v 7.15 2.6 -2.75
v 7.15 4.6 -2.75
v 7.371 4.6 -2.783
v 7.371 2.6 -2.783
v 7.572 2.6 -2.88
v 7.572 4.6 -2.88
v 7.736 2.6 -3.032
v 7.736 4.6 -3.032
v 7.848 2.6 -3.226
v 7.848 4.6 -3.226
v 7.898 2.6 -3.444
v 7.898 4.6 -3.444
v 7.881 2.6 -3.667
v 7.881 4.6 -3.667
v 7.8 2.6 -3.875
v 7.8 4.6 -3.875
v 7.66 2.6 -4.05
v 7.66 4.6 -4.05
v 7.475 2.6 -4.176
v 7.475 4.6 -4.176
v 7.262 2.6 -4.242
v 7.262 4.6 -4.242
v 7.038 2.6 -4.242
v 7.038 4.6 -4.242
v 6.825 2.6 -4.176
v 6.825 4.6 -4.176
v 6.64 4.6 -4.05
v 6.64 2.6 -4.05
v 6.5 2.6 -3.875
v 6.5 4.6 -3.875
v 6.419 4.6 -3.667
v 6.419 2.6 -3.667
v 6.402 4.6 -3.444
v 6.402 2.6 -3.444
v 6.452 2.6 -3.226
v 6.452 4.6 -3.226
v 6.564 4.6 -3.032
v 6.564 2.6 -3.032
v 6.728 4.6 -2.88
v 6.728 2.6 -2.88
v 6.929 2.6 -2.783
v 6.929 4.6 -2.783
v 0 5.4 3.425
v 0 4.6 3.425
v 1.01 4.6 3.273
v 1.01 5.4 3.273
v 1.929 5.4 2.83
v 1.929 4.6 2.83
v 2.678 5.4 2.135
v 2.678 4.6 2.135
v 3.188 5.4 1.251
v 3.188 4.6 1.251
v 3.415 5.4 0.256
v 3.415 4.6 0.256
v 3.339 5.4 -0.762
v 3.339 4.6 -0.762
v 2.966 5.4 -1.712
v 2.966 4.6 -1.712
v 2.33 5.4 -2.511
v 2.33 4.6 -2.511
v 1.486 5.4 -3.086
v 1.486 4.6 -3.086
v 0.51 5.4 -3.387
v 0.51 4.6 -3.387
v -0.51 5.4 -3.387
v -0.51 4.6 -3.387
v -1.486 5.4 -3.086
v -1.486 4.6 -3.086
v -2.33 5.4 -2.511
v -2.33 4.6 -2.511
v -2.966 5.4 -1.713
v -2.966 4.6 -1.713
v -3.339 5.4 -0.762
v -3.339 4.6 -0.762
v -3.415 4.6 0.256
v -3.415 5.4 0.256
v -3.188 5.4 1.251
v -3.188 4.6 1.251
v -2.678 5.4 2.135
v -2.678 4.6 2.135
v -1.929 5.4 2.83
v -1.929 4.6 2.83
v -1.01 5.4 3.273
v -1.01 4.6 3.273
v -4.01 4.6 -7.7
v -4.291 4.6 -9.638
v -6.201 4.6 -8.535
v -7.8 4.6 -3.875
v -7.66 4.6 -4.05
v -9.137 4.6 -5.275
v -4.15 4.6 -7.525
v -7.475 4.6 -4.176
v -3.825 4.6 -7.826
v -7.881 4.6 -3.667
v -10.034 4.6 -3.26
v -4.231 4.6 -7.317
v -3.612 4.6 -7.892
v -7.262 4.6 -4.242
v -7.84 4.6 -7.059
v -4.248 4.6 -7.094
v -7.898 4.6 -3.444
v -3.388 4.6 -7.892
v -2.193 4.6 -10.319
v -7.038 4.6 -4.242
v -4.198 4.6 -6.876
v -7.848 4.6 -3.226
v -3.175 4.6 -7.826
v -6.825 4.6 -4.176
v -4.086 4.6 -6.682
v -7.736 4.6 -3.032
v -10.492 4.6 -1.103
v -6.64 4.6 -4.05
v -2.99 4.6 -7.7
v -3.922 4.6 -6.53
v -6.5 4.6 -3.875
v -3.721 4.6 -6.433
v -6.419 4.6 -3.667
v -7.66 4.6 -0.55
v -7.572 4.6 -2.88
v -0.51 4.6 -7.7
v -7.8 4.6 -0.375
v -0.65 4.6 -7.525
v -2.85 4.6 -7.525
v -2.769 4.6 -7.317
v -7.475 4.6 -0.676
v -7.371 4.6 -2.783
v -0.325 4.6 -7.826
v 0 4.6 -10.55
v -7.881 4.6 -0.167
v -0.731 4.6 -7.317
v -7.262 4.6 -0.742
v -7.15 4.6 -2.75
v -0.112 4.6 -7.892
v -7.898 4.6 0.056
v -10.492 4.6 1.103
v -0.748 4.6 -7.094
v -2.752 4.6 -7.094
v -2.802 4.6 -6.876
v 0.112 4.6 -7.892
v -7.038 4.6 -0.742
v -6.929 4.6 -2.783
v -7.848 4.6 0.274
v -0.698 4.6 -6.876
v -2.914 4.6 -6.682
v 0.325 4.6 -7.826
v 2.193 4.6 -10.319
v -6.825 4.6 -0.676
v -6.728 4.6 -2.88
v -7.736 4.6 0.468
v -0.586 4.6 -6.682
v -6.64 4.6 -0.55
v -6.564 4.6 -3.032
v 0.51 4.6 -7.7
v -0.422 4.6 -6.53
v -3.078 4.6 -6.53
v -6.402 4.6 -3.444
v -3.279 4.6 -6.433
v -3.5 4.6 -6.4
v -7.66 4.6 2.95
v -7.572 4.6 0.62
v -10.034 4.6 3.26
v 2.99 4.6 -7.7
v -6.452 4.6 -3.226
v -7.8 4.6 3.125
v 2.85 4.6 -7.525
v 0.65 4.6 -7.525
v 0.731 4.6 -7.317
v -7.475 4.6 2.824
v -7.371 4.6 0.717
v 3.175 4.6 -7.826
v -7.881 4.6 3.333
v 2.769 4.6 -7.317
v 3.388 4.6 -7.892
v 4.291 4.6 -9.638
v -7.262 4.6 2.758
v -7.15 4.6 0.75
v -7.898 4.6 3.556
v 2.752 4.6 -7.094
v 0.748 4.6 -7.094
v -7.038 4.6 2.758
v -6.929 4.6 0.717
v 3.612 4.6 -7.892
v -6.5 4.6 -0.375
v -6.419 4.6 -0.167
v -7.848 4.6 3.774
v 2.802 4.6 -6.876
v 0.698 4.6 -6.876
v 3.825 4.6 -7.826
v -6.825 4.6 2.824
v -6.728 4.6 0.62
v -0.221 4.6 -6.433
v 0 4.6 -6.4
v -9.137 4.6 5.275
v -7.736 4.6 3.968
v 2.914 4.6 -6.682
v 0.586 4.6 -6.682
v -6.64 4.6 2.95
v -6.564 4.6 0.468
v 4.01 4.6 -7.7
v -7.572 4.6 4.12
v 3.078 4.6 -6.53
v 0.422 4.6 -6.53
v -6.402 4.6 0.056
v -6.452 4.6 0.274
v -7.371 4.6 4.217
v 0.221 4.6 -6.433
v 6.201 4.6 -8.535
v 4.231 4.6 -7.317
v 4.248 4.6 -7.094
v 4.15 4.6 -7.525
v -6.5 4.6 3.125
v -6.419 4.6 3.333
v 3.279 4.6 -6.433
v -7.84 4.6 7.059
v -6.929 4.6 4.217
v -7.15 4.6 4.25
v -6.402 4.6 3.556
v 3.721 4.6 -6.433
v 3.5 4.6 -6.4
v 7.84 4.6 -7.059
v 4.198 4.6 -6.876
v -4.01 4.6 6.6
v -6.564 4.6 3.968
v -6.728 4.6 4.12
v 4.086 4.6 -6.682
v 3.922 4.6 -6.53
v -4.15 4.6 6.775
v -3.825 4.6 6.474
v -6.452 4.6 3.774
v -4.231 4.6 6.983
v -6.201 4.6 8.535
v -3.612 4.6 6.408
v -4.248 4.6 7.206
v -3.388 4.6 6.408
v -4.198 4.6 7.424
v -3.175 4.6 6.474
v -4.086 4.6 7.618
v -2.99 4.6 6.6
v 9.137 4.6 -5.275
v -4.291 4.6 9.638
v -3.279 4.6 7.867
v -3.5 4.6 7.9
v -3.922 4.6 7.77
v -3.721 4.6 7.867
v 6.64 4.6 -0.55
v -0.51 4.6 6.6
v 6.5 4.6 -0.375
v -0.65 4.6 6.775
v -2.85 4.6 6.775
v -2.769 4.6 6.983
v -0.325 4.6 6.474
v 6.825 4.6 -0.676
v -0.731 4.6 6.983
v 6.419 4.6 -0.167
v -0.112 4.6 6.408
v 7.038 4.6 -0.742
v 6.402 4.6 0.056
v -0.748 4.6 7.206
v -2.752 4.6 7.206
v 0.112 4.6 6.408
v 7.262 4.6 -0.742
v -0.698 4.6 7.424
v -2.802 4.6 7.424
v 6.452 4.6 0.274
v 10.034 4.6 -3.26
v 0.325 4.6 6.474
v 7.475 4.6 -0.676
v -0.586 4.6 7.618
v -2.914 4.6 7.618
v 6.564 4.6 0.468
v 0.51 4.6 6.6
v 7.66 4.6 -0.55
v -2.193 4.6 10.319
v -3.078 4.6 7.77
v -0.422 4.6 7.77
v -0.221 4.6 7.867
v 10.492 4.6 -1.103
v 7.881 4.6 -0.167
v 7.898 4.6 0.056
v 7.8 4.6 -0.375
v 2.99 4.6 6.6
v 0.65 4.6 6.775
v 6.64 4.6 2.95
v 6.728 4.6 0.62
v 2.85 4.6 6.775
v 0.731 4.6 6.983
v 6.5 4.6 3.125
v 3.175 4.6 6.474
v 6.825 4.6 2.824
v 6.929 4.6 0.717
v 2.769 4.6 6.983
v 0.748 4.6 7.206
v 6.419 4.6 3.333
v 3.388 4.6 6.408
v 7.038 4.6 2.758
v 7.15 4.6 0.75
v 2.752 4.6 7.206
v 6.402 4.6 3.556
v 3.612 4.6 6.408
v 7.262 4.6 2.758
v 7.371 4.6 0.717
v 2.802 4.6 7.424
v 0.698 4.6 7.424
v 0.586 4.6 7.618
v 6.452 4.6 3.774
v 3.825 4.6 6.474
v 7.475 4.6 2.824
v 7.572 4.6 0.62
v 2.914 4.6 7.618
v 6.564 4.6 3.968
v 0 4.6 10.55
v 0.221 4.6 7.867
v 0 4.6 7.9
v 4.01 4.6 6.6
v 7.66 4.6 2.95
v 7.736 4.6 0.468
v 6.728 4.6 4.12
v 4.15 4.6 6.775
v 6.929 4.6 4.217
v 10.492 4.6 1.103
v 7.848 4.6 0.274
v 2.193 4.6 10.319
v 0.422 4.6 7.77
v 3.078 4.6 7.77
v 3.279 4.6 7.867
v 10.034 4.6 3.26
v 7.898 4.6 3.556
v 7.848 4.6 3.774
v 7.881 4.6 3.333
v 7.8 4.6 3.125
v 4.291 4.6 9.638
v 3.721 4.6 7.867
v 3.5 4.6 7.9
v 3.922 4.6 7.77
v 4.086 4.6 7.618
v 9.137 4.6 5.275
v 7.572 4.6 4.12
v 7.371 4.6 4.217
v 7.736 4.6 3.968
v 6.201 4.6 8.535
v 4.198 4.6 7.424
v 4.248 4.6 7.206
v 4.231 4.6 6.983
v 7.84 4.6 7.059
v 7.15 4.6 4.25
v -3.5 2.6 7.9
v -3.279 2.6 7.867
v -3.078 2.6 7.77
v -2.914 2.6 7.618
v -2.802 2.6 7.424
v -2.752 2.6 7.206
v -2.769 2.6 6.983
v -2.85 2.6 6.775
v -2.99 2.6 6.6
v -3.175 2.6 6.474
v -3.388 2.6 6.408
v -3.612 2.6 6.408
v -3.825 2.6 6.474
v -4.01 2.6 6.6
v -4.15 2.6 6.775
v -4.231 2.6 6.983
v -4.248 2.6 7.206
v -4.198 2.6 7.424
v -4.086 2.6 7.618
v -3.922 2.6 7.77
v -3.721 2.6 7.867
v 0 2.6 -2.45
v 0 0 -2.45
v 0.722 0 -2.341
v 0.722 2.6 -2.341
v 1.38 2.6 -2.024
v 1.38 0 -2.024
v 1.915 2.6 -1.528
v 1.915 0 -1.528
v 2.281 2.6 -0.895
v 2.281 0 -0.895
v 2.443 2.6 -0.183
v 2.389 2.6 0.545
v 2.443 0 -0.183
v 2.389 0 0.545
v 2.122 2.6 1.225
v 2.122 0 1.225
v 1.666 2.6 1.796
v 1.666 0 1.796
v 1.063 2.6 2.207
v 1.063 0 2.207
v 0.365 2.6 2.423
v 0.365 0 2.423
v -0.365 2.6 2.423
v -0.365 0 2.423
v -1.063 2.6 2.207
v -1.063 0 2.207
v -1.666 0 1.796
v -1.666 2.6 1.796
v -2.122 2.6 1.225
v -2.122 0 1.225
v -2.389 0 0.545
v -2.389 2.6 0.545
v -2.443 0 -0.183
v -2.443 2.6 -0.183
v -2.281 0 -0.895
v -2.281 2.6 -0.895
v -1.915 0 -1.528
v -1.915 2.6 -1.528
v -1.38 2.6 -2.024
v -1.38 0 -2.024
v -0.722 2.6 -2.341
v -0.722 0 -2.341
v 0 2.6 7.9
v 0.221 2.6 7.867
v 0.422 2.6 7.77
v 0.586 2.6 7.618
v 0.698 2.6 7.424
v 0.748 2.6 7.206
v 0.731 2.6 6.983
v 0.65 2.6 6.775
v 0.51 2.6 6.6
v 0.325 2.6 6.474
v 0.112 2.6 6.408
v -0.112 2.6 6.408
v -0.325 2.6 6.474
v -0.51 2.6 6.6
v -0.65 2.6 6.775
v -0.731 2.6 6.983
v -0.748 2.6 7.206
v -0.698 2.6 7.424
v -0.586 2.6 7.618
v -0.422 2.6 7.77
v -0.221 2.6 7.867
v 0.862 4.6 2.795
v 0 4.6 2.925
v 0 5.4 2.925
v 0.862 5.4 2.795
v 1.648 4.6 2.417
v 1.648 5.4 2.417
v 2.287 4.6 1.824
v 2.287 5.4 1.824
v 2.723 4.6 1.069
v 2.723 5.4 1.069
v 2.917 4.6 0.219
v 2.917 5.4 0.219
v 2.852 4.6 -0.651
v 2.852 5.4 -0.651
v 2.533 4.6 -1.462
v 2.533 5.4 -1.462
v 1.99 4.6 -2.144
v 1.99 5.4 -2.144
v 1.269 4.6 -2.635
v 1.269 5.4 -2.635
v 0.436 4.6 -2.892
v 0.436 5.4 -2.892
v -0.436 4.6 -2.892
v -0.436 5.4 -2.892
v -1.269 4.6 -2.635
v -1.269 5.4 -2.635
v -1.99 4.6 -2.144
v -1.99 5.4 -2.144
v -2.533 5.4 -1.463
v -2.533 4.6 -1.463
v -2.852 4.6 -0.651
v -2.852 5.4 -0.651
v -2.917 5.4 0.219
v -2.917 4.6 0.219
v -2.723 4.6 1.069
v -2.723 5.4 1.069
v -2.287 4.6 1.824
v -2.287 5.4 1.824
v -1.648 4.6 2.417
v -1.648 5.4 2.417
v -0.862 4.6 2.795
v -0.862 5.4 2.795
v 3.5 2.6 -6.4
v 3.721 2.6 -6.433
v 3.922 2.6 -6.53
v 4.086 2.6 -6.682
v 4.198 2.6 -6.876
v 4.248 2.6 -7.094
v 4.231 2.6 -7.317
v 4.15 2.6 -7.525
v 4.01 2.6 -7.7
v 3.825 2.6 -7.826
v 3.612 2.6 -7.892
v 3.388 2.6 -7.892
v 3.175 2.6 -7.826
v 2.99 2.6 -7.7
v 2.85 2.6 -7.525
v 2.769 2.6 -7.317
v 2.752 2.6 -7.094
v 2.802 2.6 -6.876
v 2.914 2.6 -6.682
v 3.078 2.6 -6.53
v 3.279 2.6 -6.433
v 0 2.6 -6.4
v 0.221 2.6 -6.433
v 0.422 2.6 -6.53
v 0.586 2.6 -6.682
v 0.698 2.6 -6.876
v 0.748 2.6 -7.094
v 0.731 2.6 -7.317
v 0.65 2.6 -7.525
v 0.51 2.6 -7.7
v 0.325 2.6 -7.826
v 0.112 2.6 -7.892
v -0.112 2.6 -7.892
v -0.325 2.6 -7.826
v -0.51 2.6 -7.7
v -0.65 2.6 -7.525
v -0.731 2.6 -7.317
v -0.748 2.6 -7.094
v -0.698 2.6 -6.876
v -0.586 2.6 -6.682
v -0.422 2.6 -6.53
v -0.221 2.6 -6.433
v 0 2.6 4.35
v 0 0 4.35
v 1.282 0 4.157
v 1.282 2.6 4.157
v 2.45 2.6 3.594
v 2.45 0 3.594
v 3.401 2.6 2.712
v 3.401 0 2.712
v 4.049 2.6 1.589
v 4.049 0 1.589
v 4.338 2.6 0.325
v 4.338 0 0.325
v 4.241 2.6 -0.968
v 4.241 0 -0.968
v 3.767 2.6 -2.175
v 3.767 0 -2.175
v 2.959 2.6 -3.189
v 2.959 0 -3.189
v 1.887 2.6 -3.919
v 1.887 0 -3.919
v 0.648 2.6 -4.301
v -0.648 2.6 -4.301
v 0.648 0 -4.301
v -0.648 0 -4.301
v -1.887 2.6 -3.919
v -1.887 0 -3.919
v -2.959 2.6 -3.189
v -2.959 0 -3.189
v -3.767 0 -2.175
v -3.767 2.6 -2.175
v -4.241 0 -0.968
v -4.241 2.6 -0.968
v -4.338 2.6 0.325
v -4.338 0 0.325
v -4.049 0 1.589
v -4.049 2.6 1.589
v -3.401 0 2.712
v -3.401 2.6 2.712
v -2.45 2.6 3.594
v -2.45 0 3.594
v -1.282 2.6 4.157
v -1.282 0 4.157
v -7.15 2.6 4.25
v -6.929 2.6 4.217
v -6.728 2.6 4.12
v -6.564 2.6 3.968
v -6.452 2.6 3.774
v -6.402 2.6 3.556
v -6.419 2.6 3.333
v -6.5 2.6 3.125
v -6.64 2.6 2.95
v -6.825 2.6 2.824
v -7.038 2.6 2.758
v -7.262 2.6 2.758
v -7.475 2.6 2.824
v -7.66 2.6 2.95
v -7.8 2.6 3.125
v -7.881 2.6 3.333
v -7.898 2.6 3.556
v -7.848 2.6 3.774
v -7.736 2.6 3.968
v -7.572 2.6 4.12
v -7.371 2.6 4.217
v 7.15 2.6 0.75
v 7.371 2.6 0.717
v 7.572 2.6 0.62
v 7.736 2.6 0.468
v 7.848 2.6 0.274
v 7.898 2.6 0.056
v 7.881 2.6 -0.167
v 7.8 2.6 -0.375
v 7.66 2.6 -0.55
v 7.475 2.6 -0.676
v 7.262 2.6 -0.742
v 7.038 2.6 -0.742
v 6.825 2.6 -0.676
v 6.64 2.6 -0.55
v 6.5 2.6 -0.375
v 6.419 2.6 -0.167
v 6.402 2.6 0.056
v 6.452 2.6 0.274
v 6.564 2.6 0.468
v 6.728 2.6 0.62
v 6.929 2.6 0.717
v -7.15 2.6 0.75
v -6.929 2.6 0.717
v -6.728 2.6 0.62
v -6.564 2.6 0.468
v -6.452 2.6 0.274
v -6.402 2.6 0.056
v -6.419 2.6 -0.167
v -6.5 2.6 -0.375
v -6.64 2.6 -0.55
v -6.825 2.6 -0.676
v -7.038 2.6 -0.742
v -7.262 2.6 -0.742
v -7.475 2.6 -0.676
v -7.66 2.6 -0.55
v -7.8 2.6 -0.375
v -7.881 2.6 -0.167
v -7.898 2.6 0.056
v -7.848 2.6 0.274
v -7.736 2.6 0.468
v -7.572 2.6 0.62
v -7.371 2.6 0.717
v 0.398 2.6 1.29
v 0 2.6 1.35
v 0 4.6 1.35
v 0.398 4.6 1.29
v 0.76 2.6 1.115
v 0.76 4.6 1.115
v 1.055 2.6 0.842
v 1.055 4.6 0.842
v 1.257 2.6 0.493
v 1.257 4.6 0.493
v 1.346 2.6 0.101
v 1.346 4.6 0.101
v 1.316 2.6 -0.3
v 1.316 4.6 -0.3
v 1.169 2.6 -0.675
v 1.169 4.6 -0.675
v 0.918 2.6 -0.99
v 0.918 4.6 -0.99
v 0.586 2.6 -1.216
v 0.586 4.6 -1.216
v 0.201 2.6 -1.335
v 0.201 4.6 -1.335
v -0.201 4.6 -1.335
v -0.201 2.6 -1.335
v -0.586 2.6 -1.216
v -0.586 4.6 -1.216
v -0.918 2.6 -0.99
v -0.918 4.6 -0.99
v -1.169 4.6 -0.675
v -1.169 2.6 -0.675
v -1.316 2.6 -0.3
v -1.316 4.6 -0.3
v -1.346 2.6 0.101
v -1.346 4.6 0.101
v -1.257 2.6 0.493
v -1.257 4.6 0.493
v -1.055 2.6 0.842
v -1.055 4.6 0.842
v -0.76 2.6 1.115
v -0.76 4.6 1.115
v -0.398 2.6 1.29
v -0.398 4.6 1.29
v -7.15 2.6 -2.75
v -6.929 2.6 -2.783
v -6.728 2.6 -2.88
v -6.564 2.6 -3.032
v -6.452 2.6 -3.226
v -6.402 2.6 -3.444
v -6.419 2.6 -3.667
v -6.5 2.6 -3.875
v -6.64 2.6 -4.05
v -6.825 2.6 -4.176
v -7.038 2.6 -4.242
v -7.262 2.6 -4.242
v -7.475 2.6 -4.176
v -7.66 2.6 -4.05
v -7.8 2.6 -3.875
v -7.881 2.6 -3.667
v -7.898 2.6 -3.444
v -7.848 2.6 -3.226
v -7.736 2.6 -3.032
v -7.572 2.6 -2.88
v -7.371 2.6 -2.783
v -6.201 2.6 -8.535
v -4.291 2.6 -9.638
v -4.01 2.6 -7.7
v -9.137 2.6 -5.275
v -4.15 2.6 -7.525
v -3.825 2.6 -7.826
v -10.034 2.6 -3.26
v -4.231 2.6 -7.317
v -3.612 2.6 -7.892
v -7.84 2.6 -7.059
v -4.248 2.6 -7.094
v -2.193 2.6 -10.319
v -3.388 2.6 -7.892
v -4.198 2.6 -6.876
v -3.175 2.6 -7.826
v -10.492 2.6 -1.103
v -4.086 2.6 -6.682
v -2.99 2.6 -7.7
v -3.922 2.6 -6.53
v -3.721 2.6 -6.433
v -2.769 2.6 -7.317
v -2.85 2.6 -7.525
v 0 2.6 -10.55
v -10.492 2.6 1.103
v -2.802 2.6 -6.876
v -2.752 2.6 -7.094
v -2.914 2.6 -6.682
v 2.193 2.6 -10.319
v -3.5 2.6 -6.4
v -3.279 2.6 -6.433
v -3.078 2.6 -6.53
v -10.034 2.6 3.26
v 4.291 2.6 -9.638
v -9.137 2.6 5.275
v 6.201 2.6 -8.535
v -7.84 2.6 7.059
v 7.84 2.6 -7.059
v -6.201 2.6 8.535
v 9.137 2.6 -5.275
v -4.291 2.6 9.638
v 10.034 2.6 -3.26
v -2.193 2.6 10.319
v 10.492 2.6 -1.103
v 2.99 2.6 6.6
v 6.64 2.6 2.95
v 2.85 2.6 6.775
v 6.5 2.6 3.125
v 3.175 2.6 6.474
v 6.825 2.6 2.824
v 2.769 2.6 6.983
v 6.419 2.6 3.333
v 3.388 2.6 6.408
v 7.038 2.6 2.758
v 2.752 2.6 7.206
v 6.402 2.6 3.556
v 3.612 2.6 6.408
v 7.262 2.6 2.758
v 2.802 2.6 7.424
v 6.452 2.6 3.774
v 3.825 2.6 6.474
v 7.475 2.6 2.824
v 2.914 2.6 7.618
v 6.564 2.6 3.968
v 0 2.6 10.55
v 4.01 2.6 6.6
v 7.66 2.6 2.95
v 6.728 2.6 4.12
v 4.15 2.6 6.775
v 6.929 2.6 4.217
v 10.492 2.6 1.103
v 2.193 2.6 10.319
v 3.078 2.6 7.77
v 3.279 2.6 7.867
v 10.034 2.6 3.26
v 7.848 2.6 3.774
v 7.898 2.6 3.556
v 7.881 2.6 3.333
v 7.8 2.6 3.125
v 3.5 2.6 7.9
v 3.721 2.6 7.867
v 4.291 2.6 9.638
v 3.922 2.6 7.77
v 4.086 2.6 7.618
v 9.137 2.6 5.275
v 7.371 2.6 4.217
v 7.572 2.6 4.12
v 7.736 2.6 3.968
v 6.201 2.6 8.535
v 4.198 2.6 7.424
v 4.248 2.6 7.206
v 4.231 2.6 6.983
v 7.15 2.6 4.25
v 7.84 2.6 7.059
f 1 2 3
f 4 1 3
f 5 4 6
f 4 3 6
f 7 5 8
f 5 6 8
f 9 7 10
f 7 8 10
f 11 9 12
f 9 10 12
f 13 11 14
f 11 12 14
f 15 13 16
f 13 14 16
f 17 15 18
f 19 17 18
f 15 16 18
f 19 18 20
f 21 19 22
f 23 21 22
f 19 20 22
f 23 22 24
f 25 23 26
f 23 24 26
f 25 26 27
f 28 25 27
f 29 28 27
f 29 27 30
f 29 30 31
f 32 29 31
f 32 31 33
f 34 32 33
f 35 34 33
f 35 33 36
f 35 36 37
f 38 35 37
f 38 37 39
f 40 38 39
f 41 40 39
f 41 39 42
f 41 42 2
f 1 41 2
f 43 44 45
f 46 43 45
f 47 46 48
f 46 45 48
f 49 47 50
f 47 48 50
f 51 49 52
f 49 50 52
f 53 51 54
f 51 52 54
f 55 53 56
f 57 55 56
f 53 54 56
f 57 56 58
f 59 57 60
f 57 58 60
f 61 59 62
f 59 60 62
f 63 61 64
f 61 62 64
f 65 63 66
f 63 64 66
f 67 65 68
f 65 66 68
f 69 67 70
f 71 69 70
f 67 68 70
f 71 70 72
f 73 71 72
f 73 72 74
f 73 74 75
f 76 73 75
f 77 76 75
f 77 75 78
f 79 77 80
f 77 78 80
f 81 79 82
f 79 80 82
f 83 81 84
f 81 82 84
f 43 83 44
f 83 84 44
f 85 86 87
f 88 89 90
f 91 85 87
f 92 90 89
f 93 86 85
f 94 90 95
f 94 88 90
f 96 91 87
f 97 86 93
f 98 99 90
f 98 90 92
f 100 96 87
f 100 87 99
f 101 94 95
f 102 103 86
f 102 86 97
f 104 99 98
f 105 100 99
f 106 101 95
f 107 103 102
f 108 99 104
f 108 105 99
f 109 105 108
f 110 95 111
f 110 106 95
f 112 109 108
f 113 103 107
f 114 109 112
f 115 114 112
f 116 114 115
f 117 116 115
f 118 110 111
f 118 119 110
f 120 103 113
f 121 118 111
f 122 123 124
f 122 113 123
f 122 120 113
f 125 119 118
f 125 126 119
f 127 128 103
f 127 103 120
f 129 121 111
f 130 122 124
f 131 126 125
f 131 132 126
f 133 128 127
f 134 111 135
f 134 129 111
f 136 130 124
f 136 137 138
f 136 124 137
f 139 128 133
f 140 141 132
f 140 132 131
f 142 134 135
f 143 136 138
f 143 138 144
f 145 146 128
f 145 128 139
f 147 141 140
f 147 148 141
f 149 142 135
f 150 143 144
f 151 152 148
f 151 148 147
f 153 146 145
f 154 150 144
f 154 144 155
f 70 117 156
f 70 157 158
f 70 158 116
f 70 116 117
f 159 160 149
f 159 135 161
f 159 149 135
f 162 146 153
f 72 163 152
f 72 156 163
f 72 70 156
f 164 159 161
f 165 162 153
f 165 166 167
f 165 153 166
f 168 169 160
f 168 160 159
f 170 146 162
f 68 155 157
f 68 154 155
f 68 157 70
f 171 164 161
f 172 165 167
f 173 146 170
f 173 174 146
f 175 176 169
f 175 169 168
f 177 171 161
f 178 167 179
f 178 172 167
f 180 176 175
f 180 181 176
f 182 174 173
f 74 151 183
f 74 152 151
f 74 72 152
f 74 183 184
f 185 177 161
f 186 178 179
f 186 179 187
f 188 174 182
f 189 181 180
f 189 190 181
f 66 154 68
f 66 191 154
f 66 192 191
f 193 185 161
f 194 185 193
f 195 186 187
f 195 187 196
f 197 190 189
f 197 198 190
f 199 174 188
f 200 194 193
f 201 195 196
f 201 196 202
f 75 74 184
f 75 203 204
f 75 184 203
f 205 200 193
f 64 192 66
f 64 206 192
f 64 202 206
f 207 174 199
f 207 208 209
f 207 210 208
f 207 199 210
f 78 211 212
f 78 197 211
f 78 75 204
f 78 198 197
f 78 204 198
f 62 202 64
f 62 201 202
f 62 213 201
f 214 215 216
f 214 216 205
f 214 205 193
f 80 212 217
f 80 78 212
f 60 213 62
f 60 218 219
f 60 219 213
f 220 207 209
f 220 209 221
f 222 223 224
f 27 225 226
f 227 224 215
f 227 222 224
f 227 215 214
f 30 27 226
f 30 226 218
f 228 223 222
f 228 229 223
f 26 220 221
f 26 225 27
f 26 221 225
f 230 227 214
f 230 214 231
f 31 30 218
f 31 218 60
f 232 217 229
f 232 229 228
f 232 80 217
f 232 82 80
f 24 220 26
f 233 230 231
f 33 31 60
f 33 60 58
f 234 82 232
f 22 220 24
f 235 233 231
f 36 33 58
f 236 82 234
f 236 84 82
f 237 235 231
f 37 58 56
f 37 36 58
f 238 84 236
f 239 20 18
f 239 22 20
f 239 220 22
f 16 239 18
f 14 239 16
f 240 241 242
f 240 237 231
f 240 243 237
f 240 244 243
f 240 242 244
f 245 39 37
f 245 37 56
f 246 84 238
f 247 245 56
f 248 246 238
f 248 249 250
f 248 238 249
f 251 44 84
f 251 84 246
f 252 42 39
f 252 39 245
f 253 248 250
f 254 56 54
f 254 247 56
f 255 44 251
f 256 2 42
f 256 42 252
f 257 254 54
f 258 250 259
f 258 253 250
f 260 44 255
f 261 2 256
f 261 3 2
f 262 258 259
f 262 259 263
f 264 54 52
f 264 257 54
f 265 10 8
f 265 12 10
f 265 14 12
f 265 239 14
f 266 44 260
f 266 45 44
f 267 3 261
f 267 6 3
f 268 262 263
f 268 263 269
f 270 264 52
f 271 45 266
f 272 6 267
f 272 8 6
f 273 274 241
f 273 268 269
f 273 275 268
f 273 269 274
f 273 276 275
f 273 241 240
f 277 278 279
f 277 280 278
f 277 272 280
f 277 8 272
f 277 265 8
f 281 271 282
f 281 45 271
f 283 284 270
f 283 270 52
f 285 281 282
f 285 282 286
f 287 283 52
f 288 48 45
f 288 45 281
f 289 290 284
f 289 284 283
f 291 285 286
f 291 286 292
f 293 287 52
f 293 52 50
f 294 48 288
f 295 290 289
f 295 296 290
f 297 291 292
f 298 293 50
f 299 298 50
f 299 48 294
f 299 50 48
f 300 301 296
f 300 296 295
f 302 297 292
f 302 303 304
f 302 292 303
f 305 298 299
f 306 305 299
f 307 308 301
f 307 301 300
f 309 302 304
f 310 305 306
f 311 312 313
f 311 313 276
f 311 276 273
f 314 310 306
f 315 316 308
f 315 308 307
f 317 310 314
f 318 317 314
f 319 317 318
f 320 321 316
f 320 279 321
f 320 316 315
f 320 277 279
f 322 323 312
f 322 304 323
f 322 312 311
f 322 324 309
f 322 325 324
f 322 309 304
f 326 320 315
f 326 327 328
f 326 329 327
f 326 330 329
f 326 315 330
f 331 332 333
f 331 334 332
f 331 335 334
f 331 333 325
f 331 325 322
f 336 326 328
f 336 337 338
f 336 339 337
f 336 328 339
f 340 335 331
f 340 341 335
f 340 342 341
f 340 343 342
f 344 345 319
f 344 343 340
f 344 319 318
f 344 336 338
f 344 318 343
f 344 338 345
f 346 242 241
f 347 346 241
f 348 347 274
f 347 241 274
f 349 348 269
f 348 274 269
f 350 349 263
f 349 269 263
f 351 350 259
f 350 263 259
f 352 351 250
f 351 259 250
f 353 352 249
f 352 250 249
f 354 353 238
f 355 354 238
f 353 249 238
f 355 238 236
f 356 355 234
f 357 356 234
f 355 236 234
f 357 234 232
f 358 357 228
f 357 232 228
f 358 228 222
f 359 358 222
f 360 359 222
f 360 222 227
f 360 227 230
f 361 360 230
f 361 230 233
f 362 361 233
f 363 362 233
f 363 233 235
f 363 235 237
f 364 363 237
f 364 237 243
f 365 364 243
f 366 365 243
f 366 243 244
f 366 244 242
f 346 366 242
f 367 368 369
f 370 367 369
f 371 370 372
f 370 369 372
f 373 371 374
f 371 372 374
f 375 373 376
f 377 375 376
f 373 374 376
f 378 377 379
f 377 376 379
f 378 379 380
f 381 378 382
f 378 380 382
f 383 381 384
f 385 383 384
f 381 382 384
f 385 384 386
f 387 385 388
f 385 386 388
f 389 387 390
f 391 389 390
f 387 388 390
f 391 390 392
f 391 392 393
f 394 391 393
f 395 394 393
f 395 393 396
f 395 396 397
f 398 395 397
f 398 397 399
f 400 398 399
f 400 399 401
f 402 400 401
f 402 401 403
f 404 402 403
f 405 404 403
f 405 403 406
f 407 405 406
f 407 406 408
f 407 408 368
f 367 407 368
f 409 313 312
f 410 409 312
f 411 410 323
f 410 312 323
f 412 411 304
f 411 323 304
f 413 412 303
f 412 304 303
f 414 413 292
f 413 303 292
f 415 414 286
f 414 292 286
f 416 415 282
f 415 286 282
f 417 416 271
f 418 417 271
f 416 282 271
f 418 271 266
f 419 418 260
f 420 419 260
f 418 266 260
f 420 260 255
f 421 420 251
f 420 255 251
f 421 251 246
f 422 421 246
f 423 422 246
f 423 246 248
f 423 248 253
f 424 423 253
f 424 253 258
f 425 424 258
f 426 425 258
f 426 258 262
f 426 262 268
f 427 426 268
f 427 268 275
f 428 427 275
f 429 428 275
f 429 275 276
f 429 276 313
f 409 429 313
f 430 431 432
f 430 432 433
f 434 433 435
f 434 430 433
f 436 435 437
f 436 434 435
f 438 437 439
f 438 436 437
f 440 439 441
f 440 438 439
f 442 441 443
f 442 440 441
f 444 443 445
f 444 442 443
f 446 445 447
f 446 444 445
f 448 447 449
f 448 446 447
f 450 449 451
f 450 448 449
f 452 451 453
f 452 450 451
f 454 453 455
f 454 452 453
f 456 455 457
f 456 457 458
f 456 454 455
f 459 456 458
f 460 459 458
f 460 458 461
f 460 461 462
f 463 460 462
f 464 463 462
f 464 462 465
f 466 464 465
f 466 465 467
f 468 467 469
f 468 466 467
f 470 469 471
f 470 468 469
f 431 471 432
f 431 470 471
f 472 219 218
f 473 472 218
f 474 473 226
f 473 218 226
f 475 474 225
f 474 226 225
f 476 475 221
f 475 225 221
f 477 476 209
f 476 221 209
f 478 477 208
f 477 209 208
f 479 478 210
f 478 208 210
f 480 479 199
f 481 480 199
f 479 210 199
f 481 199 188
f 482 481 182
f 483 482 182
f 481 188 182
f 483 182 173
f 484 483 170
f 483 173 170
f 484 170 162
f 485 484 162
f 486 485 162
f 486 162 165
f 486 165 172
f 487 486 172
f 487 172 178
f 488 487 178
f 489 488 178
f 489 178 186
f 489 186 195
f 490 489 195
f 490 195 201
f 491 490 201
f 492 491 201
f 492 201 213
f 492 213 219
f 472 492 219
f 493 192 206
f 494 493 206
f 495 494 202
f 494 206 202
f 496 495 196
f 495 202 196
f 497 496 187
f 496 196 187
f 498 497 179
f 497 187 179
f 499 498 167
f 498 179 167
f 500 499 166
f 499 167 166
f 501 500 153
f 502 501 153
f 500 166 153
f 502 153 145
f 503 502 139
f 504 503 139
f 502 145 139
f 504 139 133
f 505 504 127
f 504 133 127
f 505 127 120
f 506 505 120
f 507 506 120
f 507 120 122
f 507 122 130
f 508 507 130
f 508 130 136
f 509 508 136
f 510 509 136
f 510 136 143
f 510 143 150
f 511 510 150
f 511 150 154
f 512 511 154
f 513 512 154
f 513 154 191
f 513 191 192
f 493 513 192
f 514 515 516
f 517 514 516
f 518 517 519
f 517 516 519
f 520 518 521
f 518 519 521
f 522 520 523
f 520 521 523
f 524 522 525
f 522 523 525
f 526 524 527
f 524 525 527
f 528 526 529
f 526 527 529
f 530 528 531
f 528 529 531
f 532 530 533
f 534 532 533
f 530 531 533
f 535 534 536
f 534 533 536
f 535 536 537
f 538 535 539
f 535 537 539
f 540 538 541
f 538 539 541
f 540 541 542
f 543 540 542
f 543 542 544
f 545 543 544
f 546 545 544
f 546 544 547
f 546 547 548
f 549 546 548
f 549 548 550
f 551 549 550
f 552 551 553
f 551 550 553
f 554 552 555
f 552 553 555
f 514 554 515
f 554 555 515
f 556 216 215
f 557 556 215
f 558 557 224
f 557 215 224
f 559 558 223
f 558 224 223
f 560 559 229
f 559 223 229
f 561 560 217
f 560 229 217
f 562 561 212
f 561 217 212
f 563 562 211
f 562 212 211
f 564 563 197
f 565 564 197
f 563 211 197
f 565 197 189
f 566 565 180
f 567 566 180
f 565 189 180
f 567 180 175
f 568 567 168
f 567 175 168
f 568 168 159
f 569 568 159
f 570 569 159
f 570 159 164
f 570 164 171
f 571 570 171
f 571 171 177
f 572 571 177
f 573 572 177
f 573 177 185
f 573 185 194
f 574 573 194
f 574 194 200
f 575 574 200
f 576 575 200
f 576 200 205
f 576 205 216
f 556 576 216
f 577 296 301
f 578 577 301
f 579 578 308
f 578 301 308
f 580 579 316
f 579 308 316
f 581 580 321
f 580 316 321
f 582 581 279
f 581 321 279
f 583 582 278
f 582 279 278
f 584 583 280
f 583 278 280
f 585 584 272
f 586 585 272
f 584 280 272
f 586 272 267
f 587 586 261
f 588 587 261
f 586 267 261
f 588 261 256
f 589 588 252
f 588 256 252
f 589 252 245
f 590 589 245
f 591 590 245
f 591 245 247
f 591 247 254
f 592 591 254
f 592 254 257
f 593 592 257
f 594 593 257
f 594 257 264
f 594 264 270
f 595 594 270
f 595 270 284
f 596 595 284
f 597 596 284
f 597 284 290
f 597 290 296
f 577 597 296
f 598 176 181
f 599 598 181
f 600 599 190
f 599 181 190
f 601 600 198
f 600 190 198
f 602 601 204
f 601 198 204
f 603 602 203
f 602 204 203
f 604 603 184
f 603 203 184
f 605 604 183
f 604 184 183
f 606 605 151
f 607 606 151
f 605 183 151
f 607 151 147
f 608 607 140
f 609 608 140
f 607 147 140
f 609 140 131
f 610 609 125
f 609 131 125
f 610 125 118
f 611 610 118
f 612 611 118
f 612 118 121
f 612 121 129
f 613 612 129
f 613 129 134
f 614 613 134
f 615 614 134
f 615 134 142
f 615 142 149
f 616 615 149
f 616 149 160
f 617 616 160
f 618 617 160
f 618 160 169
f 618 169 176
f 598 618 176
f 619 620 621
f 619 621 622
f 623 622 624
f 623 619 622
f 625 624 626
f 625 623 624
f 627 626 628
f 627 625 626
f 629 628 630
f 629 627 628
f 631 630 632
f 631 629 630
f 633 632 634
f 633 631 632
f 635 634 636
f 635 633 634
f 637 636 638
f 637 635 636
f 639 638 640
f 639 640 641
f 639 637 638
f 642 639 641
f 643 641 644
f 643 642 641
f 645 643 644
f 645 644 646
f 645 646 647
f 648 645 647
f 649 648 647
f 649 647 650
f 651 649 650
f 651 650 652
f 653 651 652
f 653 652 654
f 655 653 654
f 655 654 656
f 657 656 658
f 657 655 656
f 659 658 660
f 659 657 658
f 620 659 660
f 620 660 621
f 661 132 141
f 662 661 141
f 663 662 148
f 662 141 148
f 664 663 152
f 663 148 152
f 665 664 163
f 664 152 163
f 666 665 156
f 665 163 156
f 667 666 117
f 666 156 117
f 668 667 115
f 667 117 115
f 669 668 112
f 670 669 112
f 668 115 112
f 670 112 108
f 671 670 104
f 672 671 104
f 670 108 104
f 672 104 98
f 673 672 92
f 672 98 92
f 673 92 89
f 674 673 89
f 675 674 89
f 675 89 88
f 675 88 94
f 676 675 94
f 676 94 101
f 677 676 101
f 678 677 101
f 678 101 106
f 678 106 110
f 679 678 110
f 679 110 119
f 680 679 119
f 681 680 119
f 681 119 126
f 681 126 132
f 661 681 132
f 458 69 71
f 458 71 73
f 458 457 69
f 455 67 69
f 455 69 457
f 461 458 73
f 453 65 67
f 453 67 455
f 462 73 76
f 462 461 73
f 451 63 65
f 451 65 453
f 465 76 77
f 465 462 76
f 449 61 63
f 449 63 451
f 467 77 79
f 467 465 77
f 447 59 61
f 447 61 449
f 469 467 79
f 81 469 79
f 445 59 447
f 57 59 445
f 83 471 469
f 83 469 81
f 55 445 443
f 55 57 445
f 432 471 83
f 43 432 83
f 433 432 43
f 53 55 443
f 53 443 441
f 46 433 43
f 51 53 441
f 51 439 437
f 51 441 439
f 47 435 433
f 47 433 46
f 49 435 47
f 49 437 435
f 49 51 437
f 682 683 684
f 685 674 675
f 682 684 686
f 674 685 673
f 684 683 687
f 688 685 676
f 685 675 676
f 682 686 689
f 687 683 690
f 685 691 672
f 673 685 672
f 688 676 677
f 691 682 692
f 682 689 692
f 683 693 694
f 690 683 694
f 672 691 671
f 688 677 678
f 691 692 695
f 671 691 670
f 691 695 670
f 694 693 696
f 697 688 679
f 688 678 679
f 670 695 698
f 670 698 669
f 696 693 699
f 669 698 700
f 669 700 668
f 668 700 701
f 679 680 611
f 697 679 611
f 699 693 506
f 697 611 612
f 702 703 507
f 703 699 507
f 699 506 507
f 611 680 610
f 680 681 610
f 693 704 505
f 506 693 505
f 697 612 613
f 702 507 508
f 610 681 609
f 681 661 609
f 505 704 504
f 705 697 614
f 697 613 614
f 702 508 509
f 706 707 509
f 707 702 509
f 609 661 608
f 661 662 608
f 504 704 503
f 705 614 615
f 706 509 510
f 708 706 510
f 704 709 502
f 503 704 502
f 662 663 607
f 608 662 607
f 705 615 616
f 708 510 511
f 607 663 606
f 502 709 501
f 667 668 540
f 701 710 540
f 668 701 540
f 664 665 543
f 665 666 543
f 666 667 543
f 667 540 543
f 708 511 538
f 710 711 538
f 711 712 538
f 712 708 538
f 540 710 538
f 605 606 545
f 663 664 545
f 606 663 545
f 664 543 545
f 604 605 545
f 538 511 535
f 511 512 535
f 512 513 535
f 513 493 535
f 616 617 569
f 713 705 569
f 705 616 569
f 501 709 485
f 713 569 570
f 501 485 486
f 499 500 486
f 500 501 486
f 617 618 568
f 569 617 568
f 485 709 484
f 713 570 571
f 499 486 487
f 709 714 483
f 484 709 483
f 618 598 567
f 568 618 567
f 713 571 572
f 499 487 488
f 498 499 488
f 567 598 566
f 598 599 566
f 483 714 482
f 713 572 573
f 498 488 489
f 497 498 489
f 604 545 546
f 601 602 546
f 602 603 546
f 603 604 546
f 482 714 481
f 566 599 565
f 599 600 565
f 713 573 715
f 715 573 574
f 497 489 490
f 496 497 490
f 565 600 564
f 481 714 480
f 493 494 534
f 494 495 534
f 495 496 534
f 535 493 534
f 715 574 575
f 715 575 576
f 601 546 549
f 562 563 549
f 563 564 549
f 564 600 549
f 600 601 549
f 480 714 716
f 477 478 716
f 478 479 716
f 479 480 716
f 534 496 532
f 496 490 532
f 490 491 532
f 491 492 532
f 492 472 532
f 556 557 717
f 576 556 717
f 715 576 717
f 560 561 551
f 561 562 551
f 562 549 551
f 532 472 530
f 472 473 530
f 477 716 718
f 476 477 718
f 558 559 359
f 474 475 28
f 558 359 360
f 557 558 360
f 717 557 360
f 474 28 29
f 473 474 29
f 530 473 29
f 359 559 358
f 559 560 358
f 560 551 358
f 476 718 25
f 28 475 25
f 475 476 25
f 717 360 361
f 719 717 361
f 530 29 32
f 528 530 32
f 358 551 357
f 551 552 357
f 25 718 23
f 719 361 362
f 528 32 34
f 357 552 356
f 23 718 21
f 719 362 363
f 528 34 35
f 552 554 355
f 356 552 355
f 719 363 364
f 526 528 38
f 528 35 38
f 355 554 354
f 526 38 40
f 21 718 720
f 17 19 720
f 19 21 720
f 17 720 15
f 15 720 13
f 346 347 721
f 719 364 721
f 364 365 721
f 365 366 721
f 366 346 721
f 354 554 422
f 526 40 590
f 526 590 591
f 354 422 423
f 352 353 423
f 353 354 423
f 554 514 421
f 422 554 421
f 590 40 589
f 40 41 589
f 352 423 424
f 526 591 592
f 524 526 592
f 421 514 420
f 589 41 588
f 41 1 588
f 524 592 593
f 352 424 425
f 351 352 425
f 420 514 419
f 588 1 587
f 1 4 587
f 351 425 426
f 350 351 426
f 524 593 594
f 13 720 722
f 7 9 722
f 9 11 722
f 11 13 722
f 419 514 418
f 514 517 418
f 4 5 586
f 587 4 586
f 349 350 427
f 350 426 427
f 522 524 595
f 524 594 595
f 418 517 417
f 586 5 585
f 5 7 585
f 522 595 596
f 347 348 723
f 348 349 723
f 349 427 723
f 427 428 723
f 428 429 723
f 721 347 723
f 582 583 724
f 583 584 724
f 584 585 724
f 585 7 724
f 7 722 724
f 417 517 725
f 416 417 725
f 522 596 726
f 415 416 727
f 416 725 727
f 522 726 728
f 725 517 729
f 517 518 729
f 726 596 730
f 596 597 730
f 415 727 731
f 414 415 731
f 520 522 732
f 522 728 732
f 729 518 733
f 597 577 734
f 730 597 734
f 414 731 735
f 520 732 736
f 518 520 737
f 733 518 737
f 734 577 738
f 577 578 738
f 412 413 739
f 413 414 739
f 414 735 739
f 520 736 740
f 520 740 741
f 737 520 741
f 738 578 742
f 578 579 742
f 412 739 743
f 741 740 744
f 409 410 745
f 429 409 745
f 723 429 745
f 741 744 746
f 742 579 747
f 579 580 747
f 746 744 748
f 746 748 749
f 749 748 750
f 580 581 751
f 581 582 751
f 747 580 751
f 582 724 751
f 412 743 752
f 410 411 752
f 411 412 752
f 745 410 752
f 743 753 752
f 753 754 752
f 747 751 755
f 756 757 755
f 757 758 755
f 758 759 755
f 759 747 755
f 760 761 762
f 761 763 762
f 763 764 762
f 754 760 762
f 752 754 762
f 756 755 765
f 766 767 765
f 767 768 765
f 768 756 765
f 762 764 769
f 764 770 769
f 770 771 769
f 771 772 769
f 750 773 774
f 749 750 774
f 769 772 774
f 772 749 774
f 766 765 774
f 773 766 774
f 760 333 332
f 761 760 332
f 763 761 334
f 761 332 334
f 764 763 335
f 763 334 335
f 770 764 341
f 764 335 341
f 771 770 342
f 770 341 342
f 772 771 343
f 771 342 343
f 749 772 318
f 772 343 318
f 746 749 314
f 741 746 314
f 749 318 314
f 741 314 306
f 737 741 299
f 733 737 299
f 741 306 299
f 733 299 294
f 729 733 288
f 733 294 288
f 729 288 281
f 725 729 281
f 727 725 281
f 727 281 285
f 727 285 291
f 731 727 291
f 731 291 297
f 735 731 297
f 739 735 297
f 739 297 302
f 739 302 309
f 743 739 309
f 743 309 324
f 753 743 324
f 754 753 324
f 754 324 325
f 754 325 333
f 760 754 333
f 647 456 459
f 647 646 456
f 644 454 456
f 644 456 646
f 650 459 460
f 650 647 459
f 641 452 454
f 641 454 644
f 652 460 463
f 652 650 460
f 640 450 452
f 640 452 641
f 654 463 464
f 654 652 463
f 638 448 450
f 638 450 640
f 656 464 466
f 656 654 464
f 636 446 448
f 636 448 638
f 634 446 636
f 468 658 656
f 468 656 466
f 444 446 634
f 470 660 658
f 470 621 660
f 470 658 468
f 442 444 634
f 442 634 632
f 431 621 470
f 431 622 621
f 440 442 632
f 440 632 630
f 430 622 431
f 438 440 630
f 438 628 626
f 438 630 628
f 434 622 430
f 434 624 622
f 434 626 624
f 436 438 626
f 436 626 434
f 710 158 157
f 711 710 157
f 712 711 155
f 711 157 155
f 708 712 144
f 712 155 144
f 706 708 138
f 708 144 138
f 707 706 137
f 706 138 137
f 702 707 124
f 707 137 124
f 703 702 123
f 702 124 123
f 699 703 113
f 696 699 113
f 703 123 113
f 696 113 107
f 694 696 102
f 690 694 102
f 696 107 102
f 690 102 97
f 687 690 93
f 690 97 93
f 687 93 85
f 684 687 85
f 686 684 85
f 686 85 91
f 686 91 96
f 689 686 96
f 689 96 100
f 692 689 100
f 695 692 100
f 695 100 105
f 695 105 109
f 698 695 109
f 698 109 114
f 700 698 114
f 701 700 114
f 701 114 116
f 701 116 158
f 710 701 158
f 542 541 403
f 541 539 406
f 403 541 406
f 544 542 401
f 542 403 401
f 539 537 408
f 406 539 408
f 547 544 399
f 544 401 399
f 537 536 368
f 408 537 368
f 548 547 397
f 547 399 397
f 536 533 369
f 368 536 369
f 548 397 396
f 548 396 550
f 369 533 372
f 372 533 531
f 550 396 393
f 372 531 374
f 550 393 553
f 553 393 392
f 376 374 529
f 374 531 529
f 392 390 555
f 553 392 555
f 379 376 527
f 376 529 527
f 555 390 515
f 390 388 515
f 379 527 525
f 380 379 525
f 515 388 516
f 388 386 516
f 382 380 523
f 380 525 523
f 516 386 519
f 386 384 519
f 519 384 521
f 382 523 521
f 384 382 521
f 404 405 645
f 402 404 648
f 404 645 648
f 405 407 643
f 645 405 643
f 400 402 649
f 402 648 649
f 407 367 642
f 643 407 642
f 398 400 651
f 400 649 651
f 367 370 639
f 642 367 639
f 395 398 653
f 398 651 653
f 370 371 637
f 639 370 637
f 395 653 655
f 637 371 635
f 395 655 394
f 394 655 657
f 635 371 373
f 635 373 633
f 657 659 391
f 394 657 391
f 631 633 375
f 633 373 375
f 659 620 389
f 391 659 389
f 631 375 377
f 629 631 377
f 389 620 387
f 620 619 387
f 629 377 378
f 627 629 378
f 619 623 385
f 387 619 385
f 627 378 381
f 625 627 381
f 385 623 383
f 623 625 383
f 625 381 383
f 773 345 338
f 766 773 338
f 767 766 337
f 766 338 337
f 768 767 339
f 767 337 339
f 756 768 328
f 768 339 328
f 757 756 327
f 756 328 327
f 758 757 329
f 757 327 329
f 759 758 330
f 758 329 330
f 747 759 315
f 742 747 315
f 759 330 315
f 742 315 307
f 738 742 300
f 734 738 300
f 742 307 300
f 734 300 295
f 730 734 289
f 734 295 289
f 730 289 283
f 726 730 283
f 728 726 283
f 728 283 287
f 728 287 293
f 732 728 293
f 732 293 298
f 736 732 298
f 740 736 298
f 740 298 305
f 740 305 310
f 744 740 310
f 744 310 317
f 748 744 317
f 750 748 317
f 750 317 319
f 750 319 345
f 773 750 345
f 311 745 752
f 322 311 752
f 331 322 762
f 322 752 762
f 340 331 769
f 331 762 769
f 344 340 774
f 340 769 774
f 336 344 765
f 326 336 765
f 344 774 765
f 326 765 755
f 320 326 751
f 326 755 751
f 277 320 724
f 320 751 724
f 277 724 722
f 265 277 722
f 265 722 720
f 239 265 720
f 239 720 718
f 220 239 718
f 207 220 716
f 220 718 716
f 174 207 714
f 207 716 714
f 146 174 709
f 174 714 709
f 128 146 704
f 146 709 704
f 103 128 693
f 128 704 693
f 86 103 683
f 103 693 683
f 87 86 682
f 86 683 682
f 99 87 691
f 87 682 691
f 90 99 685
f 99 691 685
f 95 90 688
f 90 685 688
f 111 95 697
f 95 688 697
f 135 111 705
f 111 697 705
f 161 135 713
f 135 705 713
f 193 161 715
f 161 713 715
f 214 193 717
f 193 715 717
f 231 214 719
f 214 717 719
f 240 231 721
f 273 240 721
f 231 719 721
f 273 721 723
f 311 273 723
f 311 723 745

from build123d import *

# Parameters (mm, degrees)
SKETCH1_R                           = 4.35
REBAIXO_DE_ENCAIXE_DEPTH            = 2.6
SKETCH14_R                          = 2.45
FURO_DE_ENCAIXE_SERVO_DEPTH         = 3
SKETCH5_R                           = 10.55
SKETCH5_R_2                         = 1.35
BASE_REDONDA_DEPTH                  = 2
SKETCH8_R                           = 3.425
SKETCH8_R_2                         = 2.925
RESSALTO_DEPTH                      = 0.8
SKETCH9_R                           = 0.75
FUROS_DE_FIXA_O_CARGA_REDONDO_DEPTH = 16.612975373


with BuildPart() as part:
    # Sketch1 → Rebaixo de Encaixe (new body)
    with BuildSketch(Plane(origin=(0, 0, 0), x_dir=(1, 0, 0), z_dir=(0, 1, 0))):
        with Locations(Location((0, 0, 0), (0, 0, 270))):
            Circle(SKETCH1_R)
    extrude(amount=REBAIXO_DE_ENCAIXE_DEPTH)

    # Sketch14 → Furo de Encaixe - Servo (cut)
    with BuildSketch(Plane.XZ):
        with Locations(Location((0, 0, 0), (0, 0, 270))):
            Circle(SKETCH14_R)
    extrude(amount=-FURO_DE_ENCAIXE_SERVO_DEPTH, mode=Mode.SUBTRACT)

    # Sketch5 → Base Redonda (add)
    with BuildSketch(Plane(origin=(0, 2.6, 0), x_dir=(1, 0, 0), z_dir=(0, 1, 0))):
        with Locations(Location((0, 0, 0), (0, 0, 270))):
            Circle(SKETCH5_R)
        with Locations(Location((0, 0, 0), (0, 0, 270))):
            Circle(SKETCH5_R_2, mode=Mode.SUBTRACT)
    extrude(amount=BASE_REDONDA_DEPTH)

    # Sketch8 → Ressalto (add)
    with BuildSketch(Plane(origin=(0, 4.6, 0), x_dir=(1, 0, 0), z_dir=(0, 1, 0))):
        with Locations(Location((0, 0, 0), (0, 0, 270))):
            Circle(SKETCH8_R)
        with Locations(Location((0, 0, 0), (0, 0, 270))):
            Circle(SKETCH8_R_2, mode=Mode.SUBTRACT)
    extrude(amount=RESSALTO_DEPTH)

    # Sketch9 → Furos de Fixação - Carga Redondo (cut, through all)
    with BuildSketch(Plane(origin=(0, 4.6, 0), x_dir=(1, 0, 0), z_dir=(0, 1, 0))):
        with Locations(Location((0, 7.15, 0), (0, 0, 270))):
            Circle(SKETCH9_R)
        with Locations(Location((3.5, 7.15, 0), (0, 0, 270))):
            Circle(SKETCH9_R)
        with Locations(Location((-3.5, 7.15, 0), (0, 0, 270))):
            Circle(SKETCH9_R)
        with Locations(Location((7.15, 3.5, 0), (0, 0, 270))):
            Circle(SKETCH9_R)
        with Locations(Location((7.15, 0, 0), (0, 0, 270))):
            Circle(SKETCH9_R)
        with Locations(Location((7.15, -3.5, 0), (0, 0, 270))):
            Circle(SKETCH9_R)
        with Locations(Location((3.5, -7.15, 0), (0, 0, 270))):
            Circle(SKETCH9_R)
        with Locations(Location((0, -7.15, 0), (0, 0, 270))):
            Circle(SKETCH9_R)
        with Locations(Location((-3.5, -7.15, 0), (0, 0, 270))):
            Circle(SKETCH9_R)
        with Locations(Location((-7.15, -3.5, 0), (0, 0, 270))):
            Circle(SKETCH9_R)
        with Locations(Location((-7.15, 0, 0), (0, 0, 270))):
            Circle(SKETCH9_R)
        with Locations(Location((-7.15, 3.5, 0), (0, 0, 270))):
            Circle(SKETCH9_R)
    extrude(amount=-FUROS_DE_FIXA_O_CARGA_REDONDO_DEPTH, mode=Mode.SUBTRACT)


solid = part.part
